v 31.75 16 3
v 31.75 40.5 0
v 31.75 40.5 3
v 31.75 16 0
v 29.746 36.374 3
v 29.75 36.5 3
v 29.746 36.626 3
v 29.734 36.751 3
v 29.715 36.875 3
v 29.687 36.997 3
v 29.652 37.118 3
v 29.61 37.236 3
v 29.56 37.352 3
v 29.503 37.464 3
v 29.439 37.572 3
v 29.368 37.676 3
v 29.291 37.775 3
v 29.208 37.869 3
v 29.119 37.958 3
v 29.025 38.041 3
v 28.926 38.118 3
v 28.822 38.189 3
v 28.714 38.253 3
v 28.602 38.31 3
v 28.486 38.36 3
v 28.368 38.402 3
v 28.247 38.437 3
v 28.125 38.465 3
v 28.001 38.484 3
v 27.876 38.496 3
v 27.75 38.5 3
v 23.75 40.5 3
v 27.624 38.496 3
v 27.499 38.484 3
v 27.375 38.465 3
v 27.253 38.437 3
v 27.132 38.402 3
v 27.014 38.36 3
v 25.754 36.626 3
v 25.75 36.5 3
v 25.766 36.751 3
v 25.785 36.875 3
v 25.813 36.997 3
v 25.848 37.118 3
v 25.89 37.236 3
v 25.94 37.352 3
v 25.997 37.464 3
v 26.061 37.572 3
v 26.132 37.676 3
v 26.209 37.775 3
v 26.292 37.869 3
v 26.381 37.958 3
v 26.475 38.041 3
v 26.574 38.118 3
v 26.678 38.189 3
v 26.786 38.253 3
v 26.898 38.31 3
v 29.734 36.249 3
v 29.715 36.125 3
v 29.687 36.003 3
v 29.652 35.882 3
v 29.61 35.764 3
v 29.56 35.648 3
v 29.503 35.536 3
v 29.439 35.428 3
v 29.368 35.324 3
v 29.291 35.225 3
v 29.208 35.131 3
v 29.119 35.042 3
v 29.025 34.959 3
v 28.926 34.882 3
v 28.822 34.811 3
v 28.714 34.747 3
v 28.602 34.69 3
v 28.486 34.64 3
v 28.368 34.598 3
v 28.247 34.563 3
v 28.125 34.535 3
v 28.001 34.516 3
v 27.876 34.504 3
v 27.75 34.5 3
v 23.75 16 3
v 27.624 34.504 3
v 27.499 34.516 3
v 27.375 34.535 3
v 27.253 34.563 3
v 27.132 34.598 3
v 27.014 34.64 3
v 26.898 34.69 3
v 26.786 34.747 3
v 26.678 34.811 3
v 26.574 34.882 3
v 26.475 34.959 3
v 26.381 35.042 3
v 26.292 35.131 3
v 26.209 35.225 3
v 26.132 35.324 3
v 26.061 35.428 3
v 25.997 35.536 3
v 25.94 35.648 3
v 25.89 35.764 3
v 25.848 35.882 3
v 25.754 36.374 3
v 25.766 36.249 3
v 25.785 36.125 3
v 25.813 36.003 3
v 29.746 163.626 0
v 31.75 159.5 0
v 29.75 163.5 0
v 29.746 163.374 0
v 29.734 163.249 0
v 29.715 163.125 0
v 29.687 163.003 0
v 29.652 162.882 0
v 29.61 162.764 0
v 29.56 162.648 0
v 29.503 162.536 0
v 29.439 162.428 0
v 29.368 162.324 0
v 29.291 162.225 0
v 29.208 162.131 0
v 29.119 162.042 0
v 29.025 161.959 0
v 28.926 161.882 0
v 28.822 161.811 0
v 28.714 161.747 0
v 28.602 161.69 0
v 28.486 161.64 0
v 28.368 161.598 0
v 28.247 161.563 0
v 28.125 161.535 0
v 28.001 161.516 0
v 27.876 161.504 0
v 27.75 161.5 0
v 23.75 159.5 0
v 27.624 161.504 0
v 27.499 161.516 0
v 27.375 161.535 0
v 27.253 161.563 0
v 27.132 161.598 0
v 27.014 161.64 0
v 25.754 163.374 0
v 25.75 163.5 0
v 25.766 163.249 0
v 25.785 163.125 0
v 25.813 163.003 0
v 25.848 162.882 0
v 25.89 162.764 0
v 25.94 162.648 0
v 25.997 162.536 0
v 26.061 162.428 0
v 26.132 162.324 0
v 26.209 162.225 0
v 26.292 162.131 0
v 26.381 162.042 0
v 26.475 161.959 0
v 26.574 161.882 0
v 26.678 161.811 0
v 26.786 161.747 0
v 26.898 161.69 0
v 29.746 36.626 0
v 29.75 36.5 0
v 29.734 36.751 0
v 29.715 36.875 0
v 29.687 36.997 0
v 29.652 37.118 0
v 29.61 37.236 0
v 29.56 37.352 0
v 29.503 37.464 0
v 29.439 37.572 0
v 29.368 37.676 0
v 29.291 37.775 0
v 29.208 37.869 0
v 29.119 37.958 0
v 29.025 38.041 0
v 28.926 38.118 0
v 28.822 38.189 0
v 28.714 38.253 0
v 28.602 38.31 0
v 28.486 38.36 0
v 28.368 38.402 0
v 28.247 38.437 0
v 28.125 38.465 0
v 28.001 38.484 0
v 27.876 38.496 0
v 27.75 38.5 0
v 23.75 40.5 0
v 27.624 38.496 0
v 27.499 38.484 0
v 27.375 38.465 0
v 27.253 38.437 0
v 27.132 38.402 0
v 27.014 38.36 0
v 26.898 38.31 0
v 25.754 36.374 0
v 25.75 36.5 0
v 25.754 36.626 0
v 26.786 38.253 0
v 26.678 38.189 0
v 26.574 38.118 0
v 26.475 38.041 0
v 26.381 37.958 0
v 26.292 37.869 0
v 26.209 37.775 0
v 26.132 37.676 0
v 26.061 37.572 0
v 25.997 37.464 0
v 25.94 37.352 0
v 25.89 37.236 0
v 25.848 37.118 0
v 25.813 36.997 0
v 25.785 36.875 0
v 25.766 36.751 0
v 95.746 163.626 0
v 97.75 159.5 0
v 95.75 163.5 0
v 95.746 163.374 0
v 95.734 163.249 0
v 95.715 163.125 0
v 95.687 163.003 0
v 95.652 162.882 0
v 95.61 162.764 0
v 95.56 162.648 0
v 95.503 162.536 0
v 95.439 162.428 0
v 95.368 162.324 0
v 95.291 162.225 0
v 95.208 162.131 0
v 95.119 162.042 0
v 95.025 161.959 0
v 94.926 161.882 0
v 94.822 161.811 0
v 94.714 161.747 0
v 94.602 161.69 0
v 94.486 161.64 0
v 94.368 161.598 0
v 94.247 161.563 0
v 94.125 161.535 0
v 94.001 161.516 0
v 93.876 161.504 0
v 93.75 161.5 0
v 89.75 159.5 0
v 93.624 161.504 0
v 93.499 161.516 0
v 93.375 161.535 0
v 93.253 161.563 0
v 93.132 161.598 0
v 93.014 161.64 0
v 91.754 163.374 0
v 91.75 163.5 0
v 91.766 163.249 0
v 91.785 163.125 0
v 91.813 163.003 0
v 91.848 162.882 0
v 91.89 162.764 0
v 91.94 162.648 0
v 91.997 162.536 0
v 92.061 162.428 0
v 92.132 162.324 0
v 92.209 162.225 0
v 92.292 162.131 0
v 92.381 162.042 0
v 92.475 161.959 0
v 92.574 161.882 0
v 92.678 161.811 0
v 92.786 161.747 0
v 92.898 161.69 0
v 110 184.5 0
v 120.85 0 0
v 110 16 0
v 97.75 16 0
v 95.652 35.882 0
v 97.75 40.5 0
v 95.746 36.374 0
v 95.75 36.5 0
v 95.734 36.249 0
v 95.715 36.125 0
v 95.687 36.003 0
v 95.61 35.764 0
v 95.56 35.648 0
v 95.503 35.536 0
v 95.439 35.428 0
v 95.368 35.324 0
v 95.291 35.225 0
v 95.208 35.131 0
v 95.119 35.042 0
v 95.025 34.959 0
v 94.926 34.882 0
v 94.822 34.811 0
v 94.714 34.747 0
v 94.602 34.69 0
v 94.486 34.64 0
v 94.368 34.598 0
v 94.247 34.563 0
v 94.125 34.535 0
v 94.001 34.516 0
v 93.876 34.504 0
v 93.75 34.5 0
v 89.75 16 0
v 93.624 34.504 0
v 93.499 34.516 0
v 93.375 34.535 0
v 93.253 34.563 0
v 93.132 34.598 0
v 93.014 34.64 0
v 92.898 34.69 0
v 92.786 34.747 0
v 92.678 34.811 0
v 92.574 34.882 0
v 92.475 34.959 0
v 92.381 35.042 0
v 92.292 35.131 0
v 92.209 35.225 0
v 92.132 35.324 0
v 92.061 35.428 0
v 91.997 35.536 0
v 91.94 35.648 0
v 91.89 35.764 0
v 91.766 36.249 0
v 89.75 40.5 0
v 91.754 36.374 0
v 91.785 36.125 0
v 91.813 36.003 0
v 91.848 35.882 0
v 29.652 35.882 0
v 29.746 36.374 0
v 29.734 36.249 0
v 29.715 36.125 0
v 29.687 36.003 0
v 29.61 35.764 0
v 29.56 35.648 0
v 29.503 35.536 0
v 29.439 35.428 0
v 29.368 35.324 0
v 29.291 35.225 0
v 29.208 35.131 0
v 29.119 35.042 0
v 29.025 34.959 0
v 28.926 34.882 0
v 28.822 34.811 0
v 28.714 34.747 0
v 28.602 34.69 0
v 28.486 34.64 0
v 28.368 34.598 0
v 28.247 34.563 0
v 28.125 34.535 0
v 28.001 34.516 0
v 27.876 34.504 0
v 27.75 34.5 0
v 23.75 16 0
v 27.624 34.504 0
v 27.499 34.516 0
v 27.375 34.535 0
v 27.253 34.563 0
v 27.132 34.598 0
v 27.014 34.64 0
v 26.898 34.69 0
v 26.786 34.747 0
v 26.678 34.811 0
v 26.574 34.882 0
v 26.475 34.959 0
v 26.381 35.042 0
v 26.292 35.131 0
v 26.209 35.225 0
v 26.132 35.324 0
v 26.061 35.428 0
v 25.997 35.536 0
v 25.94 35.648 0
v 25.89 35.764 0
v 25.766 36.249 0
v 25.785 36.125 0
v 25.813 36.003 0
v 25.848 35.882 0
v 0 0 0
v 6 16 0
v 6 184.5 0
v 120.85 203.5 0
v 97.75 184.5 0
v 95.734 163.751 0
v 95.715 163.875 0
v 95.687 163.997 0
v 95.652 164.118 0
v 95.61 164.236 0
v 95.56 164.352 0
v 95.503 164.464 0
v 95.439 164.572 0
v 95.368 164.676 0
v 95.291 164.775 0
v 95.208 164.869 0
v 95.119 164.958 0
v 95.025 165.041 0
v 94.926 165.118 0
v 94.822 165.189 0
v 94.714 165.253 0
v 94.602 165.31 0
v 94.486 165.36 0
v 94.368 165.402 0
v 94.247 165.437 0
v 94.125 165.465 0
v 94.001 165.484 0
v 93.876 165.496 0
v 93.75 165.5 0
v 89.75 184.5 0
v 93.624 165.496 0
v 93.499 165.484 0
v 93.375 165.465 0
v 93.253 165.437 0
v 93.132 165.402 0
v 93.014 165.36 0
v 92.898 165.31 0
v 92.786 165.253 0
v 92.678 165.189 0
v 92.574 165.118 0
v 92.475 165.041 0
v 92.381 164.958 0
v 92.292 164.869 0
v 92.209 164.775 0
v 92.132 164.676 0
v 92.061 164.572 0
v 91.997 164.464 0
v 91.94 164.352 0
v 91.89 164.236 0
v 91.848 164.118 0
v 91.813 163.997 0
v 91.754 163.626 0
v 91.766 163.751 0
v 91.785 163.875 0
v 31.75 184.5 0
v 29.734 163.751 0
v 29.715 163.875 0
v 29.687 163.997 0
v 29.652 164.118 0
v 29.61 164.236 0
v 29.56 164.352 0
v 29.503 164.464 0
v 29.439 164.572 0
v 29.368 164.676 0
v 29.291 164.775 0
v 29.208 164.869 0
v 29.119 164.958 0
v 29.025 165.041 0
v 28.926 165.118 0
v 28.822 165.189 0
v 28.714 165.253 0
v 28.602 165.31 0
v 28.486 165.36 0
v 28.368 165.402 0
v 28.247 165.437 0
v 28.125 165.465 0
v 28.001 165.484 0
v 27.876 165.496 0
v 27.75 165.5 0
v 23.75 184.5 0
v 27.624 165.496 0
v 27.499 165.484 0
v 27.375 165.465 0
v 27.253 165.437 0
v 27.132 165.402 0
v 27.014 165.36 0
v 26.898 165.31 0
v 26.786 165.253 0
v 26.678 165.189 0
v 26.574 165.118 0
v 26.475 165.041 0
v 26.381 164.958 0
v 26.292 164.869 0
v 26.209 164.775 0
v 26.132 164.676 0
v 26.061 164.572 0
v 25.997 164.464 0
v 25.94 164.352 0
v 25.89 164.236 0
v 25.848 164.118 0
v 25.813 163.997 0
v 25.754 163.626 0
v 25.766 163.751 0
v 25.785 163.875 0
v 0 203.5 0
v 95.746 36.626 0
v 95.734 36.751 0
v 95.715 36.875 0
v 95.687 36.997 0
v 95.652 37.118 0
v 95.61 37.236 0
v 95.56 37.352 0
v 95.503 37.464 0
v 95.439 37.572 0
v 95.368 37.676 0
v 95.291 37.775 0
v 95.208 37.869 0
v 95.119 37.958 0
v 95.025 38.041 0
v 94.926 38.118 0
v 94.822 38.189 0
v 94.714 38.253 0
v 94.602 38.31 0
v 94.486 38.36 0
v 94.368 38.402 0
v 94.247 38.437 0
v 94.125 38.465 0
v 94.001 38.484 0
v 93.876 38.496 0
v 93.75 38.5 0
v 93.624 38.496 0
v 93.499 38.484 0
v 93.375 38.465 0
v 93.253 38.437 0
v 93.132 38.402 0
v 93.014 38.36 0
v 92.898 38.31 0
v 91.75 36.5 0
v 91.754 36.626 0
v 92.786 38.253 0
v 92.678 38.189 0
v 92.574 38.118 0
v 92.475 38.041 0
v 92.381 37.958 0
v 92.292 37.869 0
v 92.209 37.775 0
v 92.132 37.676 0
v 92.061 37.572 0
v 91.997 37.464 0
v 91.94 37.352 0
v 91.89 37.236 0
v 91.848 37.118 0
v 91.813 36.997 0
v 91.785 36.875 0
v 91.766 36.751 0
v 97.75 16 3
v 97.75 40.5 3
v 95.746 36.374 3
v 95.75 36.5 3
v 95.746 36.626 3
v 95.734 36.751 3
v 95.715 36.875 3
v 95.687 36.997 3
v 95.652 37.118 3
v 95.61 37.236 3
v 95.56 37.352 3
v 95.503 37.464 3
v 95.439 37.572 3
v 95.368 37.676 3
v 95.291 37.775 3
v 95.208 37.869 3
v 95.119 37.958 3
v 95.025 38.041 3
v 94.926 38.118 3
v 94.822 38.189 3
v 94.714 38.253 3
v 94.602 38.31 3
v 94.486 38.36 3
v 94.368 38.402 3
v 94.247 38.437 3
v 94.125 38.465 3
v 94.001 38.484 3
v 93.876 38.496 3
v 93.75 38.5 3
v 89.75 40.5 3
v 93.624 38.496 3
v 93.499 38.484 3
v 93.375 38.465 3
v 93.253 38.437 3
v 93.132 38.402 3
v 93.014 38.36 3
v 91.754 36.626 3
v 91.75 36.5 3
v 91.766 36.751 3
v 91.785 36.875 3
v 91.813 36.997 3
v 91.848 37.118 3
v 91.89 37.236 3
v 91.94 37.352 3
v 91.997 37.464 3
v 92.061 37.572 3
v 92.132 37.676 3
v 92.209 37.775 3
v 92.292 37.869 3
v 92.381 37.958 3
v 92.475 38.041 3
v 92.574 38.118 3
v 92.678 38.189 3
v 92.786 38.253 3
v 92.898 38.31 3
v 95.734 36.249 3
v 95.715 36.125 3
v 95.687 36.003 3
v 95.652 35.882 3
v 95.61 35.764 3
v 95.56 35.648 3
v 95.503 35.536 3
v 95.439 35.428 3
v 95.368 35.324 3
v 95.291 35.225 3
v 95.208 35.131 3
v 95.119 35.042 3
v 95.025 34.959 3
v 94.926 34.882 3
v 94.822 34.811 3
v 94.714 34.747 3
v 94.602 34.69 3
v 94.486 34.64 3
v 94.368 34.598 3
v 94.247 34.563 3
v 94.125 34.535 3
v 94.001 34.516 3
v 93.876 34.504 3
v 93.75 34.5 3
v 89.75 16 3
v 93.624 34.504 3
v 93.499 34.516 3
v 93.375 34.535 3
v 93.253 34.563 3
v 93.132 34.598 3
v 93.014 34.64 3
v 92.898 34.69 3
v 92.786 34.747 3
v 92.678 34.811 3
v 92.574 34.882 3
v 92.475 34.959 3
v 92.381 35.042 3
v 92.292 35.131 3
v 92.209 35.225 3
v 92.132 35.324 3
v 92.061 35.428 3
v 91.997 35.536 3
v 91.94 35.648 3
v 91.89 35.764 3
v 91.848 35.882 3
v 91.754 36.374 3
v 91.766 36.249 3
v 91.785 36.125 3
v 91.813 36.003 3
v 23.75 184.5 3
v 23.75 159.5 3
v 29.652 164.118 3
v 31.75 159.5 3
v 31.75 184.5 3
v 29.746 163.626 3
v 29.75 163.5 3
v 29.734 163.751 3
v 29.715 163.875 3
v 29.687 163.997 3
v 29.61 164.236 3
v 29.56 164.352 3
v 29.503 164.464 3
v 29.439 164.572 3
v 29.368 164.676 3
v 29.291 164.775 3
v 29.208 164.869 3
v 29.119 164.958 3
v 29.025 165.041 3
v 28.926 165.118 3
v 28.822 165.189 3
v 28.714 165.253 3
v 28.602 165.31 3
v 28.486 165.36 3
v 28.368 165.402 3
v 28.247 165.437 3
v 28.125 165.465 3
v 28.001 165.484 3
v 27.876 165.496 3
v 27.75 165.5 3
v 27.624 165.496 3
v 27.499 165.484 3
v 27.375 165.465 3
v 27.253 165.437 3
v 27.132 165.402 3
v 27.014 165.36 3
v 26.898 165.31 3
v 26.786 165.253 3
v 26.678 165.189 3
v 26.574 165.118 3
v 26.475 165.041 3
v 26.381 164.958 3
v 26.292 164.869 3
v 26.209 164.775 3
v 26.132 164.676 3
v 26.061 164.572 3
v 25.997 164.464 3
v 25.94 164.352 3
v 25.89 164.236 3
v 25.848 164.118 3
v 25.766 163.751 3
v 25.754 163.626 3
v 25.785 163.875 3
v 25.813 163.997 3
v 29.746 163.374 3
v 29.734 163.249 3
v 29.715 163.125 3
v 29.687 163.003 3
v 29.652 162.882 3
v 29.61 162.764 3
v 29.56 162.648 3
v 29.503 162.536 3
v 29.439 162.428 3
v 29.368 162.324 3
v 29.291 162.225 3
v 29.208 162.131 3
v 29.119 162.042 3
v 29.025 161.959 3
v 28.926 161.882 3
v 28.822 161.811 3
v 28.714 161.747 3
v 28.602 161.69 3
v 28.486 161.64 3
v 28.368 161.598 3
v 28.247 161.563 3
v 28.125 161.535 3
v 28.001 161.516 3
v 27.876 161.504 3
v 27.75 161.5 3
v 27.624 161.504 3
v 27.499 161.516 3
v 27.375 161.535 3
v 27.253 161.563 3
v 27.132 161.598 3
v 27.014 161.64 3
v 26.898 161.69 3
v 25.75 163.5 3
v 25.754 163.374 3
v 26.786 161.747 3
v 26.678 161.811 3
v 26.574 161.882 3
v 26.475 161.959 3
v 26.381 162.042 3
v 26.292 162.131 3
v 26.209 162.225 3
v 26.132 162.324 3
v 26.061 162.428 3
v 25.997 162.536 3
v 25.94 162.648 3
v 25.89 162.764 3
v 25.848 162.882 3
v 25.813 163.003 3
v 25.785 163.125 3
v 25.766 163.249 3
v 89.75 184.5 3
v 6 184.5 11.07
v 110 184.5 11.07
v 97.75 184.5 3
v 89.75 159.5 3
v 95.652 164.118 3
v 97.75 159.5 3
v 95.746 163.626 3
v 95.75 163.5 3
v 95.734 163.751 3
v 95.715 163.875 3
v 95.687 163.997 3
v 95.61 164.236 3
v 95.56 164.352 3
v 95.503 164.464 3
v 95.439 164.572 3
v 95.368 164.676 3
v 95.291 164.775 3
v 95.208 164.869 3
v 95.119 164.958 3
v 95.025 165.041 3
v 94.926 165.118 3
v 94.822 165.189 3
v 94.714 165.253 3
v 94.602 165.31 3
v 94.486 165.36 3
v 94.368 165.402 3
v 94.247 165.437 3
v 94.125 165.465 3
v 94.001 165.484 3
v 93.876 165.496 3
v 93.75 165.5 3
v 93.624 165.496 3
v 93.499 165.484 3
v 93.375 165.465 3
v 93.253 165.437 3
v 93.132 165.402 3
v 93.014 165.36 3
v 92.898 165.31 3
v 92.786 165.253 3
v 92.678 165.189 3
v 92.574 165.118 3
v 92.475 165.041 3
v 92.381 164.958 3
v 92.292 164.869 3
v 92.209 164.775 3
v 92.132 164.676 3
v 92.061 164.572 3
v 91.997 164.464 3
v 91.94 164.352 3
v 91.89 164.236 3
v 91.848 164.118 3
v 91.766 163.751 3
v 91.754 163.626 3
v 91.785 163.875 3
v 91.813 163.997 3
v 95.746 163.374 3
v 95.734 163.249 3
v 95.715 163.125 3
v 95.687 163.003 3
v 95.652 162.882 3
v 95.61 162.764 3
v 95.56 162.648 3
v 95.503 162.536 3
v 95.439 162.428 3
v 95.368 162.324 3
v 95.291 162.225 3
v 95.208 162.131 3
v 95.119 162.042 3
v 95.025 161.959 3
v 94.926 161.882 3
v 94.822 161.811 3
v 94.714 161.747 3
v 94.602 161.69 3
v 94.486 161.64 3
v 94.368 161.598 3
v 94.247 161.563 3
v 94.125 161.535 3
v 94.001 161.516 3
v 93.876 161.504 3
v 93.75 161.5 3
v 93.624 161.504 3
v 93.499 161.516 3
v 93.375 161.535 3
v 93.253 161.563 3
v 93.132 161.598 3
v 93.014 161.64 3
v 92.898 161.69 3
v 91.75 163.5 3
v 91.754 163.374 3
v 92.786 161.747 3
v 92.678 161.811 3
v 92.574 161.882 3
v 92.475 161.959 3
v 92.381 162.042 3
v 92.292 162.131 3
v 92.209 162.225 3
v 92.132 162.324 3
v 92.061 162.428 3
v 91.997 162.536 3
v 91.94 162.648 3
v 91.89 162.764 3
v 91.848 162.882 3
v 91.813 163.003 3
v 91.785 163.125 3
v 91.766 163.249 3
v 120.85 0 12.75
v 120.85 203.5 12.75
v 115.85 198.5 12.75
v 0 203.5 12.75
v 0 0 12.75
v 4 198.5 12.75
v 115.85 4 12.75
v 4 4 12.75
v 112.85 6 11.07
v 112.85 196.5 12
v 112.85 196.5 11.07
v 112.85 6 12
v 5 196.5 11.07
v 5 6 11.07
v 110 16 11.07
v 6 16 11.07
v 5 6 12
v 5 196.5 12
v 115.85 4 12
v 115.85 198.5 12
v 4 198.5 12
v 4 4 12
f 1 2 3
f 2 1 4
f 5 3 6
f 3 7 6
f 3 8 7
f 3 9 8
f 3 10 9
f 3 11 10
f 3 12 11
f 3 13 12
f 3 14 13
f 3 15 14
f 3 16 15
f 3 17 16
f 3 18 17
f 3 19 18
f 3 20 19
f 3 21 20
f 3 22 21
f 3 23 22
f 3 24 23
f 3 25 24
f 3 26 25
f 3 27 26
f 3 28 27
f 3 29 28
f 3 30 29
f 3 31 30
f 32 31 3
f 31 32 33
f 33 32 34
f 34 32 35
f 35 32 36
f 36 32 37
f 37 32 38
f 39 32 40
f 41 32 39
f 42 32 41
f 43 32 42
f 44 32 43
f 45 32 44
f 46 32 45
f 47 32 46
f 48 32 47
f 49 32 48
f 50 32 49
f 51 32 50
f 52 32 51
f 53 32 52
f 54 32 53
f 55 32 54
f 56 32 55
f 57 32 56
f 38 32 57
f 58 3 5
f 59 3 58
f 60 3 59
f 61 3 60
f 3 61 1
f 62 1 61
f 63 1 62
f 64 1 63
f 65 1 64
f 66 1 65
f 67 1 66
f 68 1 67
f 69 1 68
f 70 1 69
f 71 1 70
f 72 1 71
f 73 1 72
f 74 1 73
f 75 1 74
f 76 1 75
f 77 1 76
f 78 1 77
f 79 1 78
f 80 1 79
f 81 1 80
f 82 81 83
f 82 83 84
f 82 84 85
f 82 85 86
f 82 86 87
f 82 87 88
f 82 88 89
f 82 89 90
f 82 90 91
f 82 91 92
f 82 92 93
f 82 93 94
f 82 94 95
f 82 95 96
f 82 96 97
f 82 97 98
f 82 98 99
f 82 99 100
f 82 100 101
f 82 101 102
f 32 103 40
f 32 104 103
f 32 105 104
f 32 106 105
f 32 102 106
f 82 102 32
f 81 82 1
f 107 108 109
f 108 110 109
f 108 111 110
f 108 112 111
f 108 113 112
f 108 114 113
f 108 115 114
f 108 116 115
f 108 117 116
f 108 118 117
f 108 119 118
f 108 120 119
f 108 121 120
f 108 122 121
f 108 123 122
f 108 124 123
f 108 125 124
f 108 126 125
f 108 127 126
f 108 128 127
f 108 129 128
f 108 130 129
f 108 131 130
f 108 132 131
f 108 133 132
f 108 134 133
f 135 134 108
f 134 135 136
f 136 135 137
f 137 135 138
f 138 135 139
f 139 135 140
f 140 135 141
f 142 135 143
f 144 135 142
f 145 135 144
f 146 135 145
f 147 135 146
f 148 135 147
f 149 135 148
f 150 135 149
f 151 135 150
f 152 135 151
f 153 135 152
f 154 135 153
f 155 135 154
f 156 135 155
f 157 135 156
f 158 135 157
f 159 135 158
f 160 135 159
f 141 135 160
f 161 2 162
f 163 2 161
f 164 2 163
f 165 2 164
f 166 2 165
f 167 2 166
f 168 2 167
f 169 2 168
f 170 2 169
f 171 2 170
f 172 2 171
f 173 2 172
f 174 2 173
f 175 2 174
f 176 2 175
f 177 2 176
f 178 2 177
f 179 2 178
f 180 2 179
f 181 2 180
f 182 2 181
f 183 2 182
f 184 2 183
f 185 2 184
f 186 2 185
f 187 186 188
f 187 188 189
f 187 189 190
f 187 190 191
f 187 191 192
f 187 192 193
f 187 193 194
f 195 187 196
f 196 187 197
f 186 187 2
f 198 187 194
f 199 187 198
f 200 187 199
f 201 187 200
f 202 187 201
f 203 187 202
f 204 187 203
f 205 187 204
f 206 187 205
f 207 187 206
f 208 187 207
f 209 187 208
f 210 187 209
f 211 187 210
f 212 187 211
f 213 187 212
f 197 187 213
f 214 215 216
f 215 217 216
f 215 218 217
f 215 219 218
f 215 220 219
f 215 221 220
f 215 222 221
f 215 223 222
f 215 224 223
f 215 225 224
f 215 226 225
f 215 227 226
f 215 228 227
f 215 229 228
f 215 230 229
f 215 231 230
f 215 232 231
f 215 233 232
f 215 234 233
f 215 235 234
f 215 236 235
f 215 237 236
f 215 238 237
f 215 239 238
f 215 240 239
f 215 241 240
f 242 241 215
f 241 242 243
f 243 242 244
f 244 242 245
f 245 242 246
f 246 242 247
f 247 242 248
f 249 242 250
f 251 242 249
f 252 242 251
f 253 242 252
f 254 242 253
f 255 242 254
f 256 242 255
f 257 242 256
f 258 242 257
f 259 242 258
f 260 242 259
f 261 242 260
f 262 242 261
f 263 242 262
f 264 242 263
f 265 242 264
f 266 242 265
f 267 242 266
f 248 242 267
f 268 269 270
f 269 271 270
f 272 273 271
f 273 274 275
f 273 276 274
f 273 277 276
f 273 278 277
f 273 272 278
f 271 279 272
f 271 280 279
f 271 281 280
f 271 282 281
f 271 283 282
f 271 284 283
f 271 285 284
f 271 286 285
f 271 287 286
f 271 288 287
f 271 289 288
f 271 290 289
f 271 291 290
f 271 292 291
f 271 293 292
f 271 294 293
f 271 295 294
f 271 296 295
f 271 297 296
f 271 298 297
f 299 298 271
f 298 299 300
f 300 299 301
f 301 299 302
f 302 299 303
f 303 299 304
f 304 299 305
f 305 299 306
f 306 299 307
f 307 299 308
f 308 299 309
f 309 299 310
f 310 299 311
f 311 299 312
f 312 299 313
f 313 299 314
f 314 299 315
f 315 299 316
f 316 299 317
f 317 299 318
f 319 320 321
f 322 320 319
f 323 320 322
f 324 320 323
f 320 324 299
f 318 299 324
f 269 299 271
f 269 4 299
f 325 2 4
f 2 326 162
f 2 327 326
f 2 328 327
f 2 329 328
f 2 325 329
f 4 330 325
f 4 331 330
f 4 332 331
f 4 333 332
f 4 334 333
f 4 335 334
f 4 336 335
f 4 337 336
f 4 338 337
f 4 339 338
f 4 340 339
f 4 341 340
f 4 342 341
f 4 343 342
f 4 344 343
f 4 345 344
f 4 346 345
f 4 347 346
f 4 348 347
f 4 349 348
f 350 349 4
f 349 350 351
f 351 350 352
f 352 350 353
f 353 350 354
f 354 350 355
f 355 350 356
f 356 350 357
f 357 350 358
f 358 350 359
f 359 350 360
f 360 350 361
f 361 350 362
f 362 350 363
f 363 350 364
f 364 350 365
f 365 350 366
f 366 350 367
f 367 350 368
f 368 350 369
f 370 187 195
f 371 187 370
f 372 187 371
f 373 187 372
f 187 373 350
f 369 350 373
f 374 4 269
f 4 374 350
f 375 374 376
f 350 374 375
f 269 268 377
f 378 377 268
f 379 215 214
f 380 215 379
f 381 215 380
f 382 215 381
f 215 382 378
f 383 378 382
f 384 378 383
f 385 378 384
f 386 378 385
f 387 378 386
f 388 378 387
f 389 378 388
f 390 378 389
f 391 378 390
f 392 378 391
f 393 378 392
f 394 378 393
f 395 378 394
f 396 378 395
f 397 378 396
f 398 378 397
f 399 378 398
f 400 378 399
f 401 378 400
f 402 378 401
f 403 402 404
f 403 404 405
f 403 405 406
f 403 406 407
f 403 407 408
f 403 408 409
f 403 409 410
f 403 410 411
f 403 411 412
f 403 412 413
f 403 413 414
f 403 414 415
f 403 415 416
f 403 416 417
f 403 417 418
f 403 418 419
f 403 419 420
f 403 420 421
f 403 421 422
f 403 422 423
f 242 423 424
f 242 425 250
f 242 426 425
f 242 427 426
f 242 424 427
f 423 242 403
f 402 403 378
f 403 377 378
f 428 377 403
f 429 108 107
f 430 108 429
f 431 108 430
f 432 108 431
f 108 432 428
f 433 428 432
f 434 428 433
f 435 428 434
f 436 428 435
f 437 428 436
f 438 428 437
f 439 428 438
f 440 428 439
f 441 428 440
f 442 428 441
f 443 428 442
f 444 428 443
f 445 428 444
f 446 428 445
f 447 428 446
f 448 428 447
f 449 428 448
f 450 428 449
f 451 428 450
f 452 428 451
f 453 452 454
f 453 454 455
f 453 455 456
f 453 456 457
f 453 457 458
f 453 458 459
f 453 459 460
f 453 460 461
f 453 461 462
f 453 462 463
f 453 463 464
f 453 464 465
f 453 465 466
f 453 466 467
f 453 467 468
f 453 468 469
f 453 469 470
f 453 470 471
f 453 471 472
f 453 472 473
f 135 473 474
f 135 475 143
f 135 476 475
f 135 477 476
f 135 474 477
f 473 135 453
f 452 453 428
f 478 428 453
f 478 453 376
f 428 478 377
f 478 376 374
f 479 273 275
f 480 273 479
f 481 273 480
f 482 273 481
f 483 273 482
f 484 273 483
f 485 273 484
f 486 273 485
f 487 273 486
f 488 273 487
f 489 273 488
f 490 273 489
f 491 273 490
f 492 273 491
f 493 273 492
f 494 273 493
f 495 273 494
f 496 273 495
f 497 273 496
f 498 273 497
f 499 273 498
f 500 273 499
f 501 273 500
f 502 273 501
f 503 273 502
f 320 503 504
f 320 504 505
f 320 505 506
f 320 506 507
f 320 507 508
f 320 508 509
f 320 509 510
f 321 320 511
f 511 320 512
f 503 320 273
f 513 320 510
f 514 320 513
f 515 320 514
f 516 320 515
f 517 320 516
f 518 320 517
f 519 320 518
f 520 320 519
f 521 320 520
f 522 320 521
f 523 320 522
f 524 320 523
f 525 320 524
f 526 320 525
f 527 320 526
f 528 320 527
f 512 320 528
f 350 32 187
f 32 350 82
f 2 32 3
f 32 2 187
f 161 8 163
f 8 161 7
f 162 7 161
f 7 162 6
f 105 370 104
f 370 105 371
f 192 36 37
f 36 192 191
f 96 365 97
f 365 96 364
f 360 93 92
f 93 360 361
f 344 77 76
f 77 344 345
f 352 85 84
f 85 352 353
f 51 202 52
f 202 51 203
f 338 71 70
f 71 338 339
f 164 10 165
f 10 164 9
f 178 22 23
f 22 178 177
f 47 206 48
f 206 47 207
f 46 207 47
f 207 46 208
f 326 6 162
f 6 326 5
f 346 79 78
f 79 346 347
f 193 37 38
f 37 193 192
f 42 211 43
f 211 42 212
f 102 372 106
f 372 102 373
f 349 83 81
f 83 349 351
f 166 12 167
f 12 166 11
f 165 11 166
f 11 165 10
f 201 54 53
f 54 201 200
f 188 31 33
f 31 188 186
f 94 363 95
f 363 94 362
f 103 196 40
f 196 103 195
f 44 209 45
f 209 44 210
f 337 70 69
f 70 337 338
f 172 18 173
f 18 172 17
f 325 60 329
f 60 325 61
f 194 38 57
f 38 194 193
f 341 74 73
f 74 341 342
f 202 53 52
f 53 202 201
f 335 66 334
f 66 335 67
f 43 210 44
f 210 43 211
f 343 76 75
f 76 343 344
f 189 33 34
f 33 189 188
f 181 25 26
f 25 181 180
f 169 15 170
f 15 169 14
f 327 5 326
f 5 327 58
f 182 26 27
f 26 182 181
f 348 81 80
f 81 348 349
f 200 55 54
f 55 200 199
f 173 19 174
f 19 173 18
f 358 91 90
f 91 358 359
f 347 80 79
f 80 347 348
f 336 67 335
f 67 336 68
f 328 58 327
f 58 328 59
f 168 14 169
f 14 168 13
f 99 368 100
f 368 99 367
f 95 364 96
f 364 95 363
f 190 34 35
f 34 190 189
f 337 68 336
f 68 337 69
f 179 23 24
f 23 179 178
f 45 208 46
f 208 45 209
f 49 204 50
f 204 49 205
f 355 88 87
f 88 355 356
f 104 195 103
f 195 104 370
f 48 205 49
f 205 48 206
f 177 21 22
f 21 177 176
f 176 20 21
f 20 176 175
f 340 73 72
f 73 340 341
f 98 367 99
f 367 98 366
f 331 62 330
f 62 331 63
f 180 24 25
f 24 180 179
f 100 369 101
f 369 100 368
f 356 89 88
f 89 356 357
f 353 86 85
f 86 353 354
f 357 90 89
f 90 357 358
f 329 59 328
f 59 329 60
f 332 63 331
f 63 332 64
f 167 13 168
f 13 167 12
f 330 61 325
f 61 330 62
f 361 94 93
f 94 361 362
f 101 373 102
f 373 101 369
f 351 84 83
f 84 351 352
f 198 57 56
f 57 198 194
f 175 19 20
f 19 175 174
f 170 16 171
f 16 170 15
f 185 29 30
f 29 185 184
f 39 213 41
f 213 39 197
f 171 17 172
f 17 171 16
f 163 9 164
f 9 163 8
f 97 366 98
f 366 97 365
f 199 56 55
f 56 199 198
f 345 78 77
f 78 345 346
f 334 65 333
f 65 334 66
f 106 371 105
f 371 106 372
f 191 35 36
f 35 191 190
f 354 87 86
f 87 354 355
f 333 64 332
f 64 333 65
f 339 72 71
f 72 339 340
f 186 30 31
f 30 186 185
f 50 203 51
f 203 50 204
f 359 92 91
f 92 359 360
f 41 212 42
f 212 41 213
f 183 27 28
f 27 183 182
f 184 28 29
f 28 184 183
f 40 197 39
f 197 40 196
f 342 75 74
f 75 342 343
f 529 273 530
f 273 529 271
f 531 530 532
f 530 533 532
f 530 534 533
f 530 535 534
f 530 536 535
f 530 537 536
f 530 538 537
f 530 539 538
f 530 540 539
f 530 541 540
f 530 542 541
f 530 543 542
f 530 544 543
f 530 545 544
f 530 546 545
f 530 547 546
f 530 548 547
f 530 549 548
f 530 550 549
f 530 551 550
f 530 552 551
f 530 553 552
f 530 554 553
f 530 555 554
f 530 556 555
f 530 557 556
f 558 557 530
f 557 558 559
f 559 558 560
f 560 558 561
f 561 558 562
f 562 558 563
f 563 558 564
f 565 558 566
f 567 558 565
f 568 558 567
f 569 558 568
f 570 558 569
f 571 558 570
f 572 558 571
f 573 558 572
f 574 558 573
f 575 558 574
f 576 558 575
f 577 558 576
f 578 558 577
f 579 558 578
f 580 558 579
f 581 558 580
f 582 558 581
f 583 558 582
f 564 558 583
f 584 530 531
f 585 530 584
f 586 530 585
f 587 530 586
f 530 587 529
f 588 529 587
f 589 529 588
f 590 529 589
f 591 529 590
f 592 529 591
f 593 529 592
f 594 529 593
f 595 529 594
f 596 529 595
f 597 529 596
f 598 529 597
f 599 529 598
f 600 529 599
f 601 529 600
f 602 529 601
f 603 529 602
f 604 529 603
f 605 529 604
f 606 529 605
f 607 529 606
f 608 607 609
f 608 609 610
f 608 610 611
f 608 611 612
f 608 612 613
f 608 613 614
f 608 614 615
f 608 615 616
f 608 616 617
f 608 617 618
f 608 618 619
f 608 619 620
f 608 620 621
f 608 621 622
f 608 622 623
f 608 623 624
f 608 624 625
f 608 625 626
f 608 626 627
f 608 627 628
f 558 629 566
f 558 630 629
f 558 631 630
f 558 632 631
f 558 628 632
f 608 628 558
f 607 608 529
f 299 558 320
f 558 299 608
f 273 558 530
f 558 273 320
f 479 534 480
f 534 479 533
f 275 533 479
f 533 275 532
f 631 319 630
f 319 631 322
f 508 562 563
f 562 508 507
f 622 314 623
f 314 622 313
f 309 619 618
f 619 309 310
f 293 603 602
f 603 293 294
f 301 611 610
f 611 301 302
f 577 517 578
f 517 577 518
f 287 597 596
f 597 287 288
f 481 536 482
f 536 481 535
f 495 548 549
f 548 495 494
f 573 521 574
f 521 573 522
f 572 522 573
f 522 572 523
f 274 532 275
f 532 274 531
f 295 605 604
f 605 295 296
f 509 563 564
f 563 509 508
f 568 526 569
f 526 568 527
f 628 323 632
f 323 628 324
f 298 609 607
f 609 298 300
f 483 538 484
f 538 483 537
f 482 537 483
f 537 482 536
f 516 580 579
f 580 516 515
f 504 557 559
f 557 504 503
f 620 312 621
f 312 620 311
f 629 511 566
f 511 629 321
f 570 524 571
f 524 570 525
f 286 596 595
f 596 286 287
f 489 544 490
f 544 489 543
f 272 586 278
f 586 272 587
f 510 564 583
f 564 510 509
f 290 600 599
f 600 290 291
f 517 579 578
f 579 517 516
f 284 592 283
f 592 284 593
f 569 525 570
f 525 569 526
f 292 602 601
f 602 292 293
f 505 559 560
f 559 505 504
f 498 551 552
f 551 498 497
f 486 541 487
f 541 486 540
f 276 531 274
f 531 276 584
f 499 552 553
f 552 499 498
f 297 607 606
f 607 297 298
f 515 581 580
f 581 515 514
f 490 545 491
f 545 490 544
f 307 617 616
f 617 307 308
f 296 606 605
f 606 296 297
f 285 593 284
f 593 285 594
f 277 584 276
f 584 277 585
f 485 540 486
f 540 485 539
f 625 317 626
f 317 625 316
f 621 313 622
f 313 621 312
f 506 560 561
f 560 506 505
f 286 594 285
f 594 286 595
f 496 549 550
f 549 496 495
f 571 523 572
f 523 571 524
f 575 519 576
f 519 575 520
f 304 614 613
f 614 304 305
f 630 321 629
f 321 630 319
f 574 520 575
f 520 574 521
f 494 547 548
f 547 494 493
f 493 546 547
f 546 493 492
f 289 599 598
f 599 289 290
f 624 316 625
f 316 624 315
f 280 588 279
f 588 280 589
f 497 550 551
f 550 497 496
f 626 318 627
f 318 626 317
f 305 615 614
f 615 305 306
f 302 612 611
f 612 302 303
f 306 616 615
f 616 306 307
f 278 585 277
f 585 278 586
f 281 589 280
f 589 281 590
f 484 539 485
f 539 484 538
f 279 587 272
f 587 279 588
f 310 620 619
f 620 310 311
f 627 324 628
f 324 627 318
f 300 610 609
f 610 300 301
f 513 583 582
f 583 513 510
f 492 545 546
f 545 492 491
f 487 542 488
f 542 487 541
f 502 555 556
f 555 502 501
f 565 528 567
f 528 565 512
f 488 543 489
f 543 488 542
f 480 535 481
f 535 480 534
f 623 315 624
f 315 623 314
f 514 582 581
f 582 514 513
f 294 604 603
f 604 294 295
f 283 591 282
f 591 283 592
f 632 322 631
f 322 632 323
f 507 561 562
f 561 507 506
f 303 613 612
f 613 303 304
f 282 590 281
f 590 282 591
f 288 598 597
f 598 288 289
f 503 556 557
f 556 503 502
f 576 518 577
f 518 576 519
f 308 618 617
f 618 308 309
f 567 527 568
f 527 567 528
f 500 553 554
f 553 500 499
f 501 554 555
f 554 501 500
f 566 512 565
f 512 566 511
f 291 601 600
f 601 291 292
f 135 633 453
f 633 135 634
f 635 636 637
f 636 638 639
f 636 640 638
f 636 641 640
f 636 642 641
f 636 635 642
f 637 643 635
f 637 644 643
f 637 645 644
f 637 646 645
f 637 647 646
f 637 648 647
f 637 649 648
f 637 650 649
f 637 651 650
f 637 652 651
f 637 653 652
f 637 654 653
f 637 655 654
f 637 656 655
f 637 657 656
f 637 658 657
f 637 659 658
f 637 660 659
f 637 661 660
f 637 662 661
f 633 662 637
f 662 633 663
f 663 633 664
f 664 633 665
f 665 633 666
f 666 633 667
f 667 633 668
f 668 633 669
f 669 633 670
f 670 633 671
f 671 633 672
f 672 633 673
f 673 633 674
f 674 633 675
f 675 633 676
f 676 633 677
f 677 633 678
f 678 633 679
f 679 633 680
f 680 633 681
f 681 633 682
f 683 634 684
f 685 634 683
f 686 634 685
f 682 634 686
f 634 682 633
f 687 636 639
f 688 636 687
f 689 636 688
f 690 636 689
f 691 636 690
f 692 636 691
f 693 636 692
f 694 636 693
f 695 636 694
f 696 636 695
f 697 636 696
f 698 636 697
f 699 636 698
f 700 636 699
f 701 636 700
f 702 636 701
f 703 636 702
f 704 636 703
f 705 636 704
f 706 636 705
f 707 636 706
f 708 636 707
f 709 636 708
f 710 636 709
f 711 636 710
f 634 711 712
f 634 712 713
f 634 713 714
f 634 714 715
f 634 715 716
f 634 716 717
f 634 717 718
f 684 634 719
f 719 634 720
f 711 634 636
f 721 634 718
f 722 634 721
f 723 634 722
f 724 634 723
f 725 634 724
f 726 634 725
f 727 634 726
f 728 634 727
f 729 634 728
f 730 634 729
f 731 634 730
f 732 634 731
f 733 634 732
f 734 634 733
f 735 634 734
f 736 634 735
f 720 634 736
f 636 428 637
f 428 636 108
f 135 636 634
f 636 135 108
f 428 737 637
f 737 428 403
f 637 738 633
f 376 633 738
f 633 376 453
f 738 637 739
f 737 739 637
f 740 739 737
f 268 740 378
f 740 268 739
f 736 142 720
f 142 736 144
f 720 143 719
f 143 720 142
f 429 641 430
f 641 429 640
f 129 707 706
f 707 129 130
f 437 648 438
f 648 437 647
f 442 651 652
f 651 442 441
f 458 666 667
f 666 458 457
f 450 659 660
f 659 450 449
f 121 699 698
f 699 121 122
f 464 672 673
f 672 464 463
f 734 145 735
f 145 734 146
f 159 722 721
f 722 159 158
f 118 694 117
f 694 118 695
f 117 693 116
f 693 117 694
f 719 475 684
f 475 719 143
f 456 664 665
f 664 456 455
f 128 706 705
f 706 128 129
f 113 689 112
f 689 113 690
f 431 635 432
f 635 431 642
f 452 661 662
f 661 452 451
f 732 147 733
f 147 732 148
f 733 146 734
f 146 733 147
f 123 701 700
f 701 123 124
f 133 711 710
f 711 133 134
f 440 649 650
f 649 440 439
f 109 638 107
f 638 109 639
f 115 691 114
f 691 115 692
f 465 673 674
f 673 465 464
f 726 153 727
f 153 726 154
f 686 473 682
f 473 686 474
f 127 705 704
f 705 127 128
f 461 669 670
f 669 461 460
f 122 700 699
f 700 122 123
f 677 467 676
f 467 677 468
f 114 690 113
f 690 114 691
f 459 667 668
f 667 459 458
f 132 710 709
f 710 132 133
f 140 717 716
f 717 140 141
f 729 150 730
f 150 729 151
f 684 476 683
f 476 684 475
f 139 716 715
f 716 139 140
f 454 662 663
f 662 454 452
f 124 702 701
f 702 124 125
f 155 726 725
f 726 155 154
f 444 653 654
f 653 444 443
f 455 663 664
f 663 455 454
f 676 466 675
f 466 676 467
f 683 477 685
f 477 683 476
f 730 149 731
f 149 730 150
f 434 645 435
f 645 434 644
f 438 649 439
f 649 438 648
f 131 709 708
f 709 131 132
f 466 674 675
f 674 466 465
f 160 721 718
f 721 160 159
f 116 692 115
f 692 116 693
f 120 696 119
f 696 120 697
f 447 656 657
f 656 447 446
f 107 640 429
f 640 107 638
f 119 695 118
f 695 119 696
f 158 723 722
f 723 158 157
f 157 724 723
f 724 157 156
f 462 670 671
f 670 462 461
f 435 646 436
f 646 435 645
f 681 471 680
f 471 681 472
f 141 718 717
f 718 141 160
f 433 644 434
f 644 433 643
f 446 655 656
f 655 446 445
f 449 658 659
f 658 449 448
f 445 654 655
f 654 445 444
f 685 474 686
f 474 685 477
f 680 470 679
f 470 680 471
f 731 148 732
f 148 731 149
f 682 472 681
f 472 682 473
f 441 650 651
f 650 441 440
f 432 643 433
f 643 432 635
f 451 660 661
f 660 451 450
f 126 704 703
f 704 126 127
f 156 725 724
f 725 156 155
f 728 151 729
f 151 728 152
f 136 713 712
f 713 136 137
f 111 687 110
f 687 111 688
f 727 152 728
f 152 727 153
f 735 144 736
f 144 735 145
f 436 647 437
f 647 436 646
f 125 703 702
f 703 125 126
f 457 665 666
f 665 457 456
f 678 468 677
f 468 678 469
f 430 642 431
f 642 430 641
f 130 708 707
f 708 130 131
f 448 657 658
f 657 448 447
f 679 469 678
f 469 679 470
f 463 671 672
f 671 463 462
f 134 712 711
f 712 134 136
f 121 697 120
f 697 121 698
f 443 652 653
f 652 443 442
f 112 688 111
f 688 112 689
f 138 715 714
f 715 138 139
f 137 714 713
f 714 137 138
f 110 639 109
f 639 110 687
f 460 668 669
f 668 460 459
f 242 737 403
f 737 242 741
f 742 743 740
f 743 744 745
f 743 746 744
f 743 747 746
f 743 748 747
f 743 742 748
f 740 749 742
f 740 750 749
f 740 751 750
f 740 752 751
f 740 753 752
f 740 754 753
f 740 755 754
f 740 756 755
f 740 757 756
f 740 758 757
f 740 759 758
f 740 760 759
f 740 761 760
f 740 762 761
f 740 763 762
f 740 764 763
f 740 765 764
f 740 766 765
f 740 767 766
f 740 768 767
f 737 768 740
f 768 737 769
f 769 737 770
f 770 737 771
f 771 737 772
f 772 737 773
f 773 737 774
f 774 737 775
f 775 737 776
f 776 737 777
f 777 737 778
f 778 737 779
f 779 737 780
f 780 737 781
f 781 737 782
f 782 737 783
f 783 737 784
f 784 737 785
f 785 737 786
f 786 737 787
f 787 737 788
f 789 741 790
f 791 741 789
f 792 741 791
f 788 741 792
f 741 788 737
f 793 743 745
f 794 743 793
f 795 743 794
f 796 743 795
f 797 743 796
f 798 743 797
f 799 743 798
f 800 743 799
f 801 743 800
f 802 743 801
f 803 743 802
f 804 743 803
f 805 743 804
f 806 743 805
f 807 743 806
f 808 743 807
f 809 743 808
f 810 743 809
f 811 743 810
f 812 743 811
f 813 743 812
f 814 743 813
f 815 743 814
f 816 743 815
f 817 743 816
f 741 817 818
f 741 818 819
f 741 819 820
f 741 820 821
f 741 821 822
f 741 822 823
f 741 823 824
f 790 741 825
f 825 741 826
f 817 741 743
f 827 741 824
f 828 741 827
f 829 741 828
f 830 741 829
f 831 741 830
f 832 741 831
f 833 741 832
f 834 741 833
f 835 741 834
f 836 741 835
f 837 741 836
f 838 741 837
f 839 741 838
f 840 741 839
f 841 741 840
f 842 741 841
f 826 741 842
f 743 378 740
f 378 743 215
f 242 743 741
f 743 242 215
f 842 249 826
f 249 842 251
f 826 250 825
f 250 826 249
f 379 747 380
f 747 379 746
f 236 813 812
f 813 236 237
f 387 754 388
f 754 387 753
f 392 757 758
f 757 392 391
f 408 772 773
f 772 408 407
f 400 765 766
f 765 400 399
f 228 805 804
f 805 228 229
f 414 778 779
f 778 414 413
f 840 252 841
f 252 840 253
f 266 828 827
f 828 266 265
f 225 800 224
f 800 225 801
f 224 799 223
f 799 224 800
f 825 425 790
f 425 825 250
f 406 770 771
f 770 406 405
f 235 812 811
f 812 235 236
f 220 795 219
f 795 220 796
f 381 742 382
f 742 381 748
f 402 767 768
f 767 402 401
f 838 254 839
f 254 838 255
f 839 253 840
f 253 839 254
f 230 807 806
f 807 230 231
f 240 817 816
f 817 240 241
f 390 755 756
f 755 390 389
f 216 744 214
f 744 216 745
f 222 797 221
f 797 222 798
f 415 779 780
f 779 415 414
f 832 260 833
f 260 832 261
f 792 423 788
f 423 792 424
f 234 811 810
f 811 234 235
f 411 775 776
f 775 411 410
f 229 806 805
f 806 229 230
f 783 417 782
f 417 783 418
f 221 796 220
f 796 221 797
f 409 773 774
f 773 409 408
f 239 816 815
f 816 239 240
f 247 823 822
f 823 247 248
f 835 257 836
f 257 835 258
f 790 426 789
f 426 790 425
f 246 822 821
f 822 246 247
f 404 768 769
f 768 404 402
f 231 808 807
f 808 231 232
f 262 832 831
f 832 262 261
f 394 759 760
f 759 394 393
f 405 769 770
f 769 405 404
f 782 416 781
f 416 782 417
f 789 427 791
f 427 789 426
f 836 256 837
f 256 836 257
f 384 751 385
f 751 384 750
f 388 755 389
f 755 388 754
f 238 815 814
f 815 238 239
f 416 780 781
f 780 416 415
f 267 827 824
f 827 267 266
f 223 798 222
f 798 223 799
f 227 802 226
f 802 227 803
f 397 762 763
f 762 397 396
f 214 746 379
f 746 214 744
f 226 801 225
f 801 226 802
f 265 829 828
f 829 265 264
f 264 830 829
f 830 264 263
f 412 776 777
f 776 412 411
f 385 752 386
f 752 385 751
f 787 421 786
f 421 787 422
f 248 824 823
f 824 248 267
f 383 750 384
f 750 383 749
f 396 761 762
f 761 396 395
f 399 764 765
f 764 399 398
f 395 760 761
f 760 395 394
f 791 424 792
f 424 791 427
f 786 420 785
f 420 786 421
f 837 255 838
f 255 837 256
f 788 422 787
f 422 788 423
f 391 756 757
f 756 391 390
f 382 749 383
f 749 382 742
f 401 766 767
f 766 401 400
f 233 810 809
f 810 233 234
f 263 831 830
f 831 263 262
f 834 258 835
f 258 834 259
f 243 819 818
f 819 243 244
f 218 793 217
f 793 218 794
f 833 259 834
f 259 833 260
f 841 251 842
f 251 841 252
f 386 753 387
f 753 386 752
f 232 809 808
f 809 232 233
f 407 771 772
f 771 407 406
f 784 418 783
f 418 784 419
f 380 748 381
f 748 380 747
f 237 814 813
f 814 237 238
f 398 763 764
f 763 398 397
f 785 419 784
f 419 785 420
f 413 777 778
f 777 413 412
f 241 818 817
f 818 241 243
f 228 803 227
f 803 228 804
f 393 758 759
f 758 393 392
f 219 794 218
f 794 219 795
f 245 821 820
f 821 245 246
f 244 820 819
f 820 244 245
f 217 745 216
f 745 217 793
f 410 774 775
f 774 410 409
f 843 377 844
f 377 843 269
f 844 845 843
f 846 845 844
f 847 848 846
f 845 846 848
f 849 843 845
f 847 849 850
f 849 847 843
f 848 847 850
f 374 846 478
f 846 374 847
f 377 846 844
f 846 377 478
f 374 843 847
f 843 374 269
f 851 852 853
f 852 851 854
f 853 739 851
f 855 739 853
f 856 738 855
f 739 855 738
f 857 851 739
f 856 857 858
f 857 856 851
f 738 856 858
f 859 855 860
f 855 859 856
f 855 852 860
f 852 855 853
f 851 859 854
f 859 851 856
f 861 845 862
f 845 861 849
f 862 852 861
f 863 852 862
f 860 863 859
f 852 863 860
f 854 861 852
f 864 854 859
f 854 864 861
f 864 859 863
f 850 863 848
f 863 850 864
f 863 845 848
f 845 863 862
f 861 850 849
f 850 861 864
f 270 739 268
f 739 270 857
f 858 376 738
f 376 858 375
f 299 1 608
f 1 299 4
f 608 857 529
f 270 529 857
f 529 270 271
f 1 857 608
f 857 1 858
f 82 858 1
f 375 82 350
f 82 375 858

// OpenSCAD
$fn=100;

module tab()
{
    difference()
    {
        cube([8,25,3]);
        translate([4,21,0])cylinder(d=4,h=3);
    }
}

translate([23.75,15.5,0]) tab();
translate([89.75,15.5,0]) tab();
translate([31.75,184.5,0]) rotate([0,0,180]) tab();
translate([97.75,184.5,0]) rotate([0,0,180]) tab();

difference()
{
    cube([120.85,203.5,12.75]);
    color("orange") translate([5,6,11.07]) cube([107.85,190.5,1.68]);
    translate([4,4,12]) cube([111.85, 194.5, 0.75]);
    translate([6,16,0]) cube([104,168.5,12.75]);
}
